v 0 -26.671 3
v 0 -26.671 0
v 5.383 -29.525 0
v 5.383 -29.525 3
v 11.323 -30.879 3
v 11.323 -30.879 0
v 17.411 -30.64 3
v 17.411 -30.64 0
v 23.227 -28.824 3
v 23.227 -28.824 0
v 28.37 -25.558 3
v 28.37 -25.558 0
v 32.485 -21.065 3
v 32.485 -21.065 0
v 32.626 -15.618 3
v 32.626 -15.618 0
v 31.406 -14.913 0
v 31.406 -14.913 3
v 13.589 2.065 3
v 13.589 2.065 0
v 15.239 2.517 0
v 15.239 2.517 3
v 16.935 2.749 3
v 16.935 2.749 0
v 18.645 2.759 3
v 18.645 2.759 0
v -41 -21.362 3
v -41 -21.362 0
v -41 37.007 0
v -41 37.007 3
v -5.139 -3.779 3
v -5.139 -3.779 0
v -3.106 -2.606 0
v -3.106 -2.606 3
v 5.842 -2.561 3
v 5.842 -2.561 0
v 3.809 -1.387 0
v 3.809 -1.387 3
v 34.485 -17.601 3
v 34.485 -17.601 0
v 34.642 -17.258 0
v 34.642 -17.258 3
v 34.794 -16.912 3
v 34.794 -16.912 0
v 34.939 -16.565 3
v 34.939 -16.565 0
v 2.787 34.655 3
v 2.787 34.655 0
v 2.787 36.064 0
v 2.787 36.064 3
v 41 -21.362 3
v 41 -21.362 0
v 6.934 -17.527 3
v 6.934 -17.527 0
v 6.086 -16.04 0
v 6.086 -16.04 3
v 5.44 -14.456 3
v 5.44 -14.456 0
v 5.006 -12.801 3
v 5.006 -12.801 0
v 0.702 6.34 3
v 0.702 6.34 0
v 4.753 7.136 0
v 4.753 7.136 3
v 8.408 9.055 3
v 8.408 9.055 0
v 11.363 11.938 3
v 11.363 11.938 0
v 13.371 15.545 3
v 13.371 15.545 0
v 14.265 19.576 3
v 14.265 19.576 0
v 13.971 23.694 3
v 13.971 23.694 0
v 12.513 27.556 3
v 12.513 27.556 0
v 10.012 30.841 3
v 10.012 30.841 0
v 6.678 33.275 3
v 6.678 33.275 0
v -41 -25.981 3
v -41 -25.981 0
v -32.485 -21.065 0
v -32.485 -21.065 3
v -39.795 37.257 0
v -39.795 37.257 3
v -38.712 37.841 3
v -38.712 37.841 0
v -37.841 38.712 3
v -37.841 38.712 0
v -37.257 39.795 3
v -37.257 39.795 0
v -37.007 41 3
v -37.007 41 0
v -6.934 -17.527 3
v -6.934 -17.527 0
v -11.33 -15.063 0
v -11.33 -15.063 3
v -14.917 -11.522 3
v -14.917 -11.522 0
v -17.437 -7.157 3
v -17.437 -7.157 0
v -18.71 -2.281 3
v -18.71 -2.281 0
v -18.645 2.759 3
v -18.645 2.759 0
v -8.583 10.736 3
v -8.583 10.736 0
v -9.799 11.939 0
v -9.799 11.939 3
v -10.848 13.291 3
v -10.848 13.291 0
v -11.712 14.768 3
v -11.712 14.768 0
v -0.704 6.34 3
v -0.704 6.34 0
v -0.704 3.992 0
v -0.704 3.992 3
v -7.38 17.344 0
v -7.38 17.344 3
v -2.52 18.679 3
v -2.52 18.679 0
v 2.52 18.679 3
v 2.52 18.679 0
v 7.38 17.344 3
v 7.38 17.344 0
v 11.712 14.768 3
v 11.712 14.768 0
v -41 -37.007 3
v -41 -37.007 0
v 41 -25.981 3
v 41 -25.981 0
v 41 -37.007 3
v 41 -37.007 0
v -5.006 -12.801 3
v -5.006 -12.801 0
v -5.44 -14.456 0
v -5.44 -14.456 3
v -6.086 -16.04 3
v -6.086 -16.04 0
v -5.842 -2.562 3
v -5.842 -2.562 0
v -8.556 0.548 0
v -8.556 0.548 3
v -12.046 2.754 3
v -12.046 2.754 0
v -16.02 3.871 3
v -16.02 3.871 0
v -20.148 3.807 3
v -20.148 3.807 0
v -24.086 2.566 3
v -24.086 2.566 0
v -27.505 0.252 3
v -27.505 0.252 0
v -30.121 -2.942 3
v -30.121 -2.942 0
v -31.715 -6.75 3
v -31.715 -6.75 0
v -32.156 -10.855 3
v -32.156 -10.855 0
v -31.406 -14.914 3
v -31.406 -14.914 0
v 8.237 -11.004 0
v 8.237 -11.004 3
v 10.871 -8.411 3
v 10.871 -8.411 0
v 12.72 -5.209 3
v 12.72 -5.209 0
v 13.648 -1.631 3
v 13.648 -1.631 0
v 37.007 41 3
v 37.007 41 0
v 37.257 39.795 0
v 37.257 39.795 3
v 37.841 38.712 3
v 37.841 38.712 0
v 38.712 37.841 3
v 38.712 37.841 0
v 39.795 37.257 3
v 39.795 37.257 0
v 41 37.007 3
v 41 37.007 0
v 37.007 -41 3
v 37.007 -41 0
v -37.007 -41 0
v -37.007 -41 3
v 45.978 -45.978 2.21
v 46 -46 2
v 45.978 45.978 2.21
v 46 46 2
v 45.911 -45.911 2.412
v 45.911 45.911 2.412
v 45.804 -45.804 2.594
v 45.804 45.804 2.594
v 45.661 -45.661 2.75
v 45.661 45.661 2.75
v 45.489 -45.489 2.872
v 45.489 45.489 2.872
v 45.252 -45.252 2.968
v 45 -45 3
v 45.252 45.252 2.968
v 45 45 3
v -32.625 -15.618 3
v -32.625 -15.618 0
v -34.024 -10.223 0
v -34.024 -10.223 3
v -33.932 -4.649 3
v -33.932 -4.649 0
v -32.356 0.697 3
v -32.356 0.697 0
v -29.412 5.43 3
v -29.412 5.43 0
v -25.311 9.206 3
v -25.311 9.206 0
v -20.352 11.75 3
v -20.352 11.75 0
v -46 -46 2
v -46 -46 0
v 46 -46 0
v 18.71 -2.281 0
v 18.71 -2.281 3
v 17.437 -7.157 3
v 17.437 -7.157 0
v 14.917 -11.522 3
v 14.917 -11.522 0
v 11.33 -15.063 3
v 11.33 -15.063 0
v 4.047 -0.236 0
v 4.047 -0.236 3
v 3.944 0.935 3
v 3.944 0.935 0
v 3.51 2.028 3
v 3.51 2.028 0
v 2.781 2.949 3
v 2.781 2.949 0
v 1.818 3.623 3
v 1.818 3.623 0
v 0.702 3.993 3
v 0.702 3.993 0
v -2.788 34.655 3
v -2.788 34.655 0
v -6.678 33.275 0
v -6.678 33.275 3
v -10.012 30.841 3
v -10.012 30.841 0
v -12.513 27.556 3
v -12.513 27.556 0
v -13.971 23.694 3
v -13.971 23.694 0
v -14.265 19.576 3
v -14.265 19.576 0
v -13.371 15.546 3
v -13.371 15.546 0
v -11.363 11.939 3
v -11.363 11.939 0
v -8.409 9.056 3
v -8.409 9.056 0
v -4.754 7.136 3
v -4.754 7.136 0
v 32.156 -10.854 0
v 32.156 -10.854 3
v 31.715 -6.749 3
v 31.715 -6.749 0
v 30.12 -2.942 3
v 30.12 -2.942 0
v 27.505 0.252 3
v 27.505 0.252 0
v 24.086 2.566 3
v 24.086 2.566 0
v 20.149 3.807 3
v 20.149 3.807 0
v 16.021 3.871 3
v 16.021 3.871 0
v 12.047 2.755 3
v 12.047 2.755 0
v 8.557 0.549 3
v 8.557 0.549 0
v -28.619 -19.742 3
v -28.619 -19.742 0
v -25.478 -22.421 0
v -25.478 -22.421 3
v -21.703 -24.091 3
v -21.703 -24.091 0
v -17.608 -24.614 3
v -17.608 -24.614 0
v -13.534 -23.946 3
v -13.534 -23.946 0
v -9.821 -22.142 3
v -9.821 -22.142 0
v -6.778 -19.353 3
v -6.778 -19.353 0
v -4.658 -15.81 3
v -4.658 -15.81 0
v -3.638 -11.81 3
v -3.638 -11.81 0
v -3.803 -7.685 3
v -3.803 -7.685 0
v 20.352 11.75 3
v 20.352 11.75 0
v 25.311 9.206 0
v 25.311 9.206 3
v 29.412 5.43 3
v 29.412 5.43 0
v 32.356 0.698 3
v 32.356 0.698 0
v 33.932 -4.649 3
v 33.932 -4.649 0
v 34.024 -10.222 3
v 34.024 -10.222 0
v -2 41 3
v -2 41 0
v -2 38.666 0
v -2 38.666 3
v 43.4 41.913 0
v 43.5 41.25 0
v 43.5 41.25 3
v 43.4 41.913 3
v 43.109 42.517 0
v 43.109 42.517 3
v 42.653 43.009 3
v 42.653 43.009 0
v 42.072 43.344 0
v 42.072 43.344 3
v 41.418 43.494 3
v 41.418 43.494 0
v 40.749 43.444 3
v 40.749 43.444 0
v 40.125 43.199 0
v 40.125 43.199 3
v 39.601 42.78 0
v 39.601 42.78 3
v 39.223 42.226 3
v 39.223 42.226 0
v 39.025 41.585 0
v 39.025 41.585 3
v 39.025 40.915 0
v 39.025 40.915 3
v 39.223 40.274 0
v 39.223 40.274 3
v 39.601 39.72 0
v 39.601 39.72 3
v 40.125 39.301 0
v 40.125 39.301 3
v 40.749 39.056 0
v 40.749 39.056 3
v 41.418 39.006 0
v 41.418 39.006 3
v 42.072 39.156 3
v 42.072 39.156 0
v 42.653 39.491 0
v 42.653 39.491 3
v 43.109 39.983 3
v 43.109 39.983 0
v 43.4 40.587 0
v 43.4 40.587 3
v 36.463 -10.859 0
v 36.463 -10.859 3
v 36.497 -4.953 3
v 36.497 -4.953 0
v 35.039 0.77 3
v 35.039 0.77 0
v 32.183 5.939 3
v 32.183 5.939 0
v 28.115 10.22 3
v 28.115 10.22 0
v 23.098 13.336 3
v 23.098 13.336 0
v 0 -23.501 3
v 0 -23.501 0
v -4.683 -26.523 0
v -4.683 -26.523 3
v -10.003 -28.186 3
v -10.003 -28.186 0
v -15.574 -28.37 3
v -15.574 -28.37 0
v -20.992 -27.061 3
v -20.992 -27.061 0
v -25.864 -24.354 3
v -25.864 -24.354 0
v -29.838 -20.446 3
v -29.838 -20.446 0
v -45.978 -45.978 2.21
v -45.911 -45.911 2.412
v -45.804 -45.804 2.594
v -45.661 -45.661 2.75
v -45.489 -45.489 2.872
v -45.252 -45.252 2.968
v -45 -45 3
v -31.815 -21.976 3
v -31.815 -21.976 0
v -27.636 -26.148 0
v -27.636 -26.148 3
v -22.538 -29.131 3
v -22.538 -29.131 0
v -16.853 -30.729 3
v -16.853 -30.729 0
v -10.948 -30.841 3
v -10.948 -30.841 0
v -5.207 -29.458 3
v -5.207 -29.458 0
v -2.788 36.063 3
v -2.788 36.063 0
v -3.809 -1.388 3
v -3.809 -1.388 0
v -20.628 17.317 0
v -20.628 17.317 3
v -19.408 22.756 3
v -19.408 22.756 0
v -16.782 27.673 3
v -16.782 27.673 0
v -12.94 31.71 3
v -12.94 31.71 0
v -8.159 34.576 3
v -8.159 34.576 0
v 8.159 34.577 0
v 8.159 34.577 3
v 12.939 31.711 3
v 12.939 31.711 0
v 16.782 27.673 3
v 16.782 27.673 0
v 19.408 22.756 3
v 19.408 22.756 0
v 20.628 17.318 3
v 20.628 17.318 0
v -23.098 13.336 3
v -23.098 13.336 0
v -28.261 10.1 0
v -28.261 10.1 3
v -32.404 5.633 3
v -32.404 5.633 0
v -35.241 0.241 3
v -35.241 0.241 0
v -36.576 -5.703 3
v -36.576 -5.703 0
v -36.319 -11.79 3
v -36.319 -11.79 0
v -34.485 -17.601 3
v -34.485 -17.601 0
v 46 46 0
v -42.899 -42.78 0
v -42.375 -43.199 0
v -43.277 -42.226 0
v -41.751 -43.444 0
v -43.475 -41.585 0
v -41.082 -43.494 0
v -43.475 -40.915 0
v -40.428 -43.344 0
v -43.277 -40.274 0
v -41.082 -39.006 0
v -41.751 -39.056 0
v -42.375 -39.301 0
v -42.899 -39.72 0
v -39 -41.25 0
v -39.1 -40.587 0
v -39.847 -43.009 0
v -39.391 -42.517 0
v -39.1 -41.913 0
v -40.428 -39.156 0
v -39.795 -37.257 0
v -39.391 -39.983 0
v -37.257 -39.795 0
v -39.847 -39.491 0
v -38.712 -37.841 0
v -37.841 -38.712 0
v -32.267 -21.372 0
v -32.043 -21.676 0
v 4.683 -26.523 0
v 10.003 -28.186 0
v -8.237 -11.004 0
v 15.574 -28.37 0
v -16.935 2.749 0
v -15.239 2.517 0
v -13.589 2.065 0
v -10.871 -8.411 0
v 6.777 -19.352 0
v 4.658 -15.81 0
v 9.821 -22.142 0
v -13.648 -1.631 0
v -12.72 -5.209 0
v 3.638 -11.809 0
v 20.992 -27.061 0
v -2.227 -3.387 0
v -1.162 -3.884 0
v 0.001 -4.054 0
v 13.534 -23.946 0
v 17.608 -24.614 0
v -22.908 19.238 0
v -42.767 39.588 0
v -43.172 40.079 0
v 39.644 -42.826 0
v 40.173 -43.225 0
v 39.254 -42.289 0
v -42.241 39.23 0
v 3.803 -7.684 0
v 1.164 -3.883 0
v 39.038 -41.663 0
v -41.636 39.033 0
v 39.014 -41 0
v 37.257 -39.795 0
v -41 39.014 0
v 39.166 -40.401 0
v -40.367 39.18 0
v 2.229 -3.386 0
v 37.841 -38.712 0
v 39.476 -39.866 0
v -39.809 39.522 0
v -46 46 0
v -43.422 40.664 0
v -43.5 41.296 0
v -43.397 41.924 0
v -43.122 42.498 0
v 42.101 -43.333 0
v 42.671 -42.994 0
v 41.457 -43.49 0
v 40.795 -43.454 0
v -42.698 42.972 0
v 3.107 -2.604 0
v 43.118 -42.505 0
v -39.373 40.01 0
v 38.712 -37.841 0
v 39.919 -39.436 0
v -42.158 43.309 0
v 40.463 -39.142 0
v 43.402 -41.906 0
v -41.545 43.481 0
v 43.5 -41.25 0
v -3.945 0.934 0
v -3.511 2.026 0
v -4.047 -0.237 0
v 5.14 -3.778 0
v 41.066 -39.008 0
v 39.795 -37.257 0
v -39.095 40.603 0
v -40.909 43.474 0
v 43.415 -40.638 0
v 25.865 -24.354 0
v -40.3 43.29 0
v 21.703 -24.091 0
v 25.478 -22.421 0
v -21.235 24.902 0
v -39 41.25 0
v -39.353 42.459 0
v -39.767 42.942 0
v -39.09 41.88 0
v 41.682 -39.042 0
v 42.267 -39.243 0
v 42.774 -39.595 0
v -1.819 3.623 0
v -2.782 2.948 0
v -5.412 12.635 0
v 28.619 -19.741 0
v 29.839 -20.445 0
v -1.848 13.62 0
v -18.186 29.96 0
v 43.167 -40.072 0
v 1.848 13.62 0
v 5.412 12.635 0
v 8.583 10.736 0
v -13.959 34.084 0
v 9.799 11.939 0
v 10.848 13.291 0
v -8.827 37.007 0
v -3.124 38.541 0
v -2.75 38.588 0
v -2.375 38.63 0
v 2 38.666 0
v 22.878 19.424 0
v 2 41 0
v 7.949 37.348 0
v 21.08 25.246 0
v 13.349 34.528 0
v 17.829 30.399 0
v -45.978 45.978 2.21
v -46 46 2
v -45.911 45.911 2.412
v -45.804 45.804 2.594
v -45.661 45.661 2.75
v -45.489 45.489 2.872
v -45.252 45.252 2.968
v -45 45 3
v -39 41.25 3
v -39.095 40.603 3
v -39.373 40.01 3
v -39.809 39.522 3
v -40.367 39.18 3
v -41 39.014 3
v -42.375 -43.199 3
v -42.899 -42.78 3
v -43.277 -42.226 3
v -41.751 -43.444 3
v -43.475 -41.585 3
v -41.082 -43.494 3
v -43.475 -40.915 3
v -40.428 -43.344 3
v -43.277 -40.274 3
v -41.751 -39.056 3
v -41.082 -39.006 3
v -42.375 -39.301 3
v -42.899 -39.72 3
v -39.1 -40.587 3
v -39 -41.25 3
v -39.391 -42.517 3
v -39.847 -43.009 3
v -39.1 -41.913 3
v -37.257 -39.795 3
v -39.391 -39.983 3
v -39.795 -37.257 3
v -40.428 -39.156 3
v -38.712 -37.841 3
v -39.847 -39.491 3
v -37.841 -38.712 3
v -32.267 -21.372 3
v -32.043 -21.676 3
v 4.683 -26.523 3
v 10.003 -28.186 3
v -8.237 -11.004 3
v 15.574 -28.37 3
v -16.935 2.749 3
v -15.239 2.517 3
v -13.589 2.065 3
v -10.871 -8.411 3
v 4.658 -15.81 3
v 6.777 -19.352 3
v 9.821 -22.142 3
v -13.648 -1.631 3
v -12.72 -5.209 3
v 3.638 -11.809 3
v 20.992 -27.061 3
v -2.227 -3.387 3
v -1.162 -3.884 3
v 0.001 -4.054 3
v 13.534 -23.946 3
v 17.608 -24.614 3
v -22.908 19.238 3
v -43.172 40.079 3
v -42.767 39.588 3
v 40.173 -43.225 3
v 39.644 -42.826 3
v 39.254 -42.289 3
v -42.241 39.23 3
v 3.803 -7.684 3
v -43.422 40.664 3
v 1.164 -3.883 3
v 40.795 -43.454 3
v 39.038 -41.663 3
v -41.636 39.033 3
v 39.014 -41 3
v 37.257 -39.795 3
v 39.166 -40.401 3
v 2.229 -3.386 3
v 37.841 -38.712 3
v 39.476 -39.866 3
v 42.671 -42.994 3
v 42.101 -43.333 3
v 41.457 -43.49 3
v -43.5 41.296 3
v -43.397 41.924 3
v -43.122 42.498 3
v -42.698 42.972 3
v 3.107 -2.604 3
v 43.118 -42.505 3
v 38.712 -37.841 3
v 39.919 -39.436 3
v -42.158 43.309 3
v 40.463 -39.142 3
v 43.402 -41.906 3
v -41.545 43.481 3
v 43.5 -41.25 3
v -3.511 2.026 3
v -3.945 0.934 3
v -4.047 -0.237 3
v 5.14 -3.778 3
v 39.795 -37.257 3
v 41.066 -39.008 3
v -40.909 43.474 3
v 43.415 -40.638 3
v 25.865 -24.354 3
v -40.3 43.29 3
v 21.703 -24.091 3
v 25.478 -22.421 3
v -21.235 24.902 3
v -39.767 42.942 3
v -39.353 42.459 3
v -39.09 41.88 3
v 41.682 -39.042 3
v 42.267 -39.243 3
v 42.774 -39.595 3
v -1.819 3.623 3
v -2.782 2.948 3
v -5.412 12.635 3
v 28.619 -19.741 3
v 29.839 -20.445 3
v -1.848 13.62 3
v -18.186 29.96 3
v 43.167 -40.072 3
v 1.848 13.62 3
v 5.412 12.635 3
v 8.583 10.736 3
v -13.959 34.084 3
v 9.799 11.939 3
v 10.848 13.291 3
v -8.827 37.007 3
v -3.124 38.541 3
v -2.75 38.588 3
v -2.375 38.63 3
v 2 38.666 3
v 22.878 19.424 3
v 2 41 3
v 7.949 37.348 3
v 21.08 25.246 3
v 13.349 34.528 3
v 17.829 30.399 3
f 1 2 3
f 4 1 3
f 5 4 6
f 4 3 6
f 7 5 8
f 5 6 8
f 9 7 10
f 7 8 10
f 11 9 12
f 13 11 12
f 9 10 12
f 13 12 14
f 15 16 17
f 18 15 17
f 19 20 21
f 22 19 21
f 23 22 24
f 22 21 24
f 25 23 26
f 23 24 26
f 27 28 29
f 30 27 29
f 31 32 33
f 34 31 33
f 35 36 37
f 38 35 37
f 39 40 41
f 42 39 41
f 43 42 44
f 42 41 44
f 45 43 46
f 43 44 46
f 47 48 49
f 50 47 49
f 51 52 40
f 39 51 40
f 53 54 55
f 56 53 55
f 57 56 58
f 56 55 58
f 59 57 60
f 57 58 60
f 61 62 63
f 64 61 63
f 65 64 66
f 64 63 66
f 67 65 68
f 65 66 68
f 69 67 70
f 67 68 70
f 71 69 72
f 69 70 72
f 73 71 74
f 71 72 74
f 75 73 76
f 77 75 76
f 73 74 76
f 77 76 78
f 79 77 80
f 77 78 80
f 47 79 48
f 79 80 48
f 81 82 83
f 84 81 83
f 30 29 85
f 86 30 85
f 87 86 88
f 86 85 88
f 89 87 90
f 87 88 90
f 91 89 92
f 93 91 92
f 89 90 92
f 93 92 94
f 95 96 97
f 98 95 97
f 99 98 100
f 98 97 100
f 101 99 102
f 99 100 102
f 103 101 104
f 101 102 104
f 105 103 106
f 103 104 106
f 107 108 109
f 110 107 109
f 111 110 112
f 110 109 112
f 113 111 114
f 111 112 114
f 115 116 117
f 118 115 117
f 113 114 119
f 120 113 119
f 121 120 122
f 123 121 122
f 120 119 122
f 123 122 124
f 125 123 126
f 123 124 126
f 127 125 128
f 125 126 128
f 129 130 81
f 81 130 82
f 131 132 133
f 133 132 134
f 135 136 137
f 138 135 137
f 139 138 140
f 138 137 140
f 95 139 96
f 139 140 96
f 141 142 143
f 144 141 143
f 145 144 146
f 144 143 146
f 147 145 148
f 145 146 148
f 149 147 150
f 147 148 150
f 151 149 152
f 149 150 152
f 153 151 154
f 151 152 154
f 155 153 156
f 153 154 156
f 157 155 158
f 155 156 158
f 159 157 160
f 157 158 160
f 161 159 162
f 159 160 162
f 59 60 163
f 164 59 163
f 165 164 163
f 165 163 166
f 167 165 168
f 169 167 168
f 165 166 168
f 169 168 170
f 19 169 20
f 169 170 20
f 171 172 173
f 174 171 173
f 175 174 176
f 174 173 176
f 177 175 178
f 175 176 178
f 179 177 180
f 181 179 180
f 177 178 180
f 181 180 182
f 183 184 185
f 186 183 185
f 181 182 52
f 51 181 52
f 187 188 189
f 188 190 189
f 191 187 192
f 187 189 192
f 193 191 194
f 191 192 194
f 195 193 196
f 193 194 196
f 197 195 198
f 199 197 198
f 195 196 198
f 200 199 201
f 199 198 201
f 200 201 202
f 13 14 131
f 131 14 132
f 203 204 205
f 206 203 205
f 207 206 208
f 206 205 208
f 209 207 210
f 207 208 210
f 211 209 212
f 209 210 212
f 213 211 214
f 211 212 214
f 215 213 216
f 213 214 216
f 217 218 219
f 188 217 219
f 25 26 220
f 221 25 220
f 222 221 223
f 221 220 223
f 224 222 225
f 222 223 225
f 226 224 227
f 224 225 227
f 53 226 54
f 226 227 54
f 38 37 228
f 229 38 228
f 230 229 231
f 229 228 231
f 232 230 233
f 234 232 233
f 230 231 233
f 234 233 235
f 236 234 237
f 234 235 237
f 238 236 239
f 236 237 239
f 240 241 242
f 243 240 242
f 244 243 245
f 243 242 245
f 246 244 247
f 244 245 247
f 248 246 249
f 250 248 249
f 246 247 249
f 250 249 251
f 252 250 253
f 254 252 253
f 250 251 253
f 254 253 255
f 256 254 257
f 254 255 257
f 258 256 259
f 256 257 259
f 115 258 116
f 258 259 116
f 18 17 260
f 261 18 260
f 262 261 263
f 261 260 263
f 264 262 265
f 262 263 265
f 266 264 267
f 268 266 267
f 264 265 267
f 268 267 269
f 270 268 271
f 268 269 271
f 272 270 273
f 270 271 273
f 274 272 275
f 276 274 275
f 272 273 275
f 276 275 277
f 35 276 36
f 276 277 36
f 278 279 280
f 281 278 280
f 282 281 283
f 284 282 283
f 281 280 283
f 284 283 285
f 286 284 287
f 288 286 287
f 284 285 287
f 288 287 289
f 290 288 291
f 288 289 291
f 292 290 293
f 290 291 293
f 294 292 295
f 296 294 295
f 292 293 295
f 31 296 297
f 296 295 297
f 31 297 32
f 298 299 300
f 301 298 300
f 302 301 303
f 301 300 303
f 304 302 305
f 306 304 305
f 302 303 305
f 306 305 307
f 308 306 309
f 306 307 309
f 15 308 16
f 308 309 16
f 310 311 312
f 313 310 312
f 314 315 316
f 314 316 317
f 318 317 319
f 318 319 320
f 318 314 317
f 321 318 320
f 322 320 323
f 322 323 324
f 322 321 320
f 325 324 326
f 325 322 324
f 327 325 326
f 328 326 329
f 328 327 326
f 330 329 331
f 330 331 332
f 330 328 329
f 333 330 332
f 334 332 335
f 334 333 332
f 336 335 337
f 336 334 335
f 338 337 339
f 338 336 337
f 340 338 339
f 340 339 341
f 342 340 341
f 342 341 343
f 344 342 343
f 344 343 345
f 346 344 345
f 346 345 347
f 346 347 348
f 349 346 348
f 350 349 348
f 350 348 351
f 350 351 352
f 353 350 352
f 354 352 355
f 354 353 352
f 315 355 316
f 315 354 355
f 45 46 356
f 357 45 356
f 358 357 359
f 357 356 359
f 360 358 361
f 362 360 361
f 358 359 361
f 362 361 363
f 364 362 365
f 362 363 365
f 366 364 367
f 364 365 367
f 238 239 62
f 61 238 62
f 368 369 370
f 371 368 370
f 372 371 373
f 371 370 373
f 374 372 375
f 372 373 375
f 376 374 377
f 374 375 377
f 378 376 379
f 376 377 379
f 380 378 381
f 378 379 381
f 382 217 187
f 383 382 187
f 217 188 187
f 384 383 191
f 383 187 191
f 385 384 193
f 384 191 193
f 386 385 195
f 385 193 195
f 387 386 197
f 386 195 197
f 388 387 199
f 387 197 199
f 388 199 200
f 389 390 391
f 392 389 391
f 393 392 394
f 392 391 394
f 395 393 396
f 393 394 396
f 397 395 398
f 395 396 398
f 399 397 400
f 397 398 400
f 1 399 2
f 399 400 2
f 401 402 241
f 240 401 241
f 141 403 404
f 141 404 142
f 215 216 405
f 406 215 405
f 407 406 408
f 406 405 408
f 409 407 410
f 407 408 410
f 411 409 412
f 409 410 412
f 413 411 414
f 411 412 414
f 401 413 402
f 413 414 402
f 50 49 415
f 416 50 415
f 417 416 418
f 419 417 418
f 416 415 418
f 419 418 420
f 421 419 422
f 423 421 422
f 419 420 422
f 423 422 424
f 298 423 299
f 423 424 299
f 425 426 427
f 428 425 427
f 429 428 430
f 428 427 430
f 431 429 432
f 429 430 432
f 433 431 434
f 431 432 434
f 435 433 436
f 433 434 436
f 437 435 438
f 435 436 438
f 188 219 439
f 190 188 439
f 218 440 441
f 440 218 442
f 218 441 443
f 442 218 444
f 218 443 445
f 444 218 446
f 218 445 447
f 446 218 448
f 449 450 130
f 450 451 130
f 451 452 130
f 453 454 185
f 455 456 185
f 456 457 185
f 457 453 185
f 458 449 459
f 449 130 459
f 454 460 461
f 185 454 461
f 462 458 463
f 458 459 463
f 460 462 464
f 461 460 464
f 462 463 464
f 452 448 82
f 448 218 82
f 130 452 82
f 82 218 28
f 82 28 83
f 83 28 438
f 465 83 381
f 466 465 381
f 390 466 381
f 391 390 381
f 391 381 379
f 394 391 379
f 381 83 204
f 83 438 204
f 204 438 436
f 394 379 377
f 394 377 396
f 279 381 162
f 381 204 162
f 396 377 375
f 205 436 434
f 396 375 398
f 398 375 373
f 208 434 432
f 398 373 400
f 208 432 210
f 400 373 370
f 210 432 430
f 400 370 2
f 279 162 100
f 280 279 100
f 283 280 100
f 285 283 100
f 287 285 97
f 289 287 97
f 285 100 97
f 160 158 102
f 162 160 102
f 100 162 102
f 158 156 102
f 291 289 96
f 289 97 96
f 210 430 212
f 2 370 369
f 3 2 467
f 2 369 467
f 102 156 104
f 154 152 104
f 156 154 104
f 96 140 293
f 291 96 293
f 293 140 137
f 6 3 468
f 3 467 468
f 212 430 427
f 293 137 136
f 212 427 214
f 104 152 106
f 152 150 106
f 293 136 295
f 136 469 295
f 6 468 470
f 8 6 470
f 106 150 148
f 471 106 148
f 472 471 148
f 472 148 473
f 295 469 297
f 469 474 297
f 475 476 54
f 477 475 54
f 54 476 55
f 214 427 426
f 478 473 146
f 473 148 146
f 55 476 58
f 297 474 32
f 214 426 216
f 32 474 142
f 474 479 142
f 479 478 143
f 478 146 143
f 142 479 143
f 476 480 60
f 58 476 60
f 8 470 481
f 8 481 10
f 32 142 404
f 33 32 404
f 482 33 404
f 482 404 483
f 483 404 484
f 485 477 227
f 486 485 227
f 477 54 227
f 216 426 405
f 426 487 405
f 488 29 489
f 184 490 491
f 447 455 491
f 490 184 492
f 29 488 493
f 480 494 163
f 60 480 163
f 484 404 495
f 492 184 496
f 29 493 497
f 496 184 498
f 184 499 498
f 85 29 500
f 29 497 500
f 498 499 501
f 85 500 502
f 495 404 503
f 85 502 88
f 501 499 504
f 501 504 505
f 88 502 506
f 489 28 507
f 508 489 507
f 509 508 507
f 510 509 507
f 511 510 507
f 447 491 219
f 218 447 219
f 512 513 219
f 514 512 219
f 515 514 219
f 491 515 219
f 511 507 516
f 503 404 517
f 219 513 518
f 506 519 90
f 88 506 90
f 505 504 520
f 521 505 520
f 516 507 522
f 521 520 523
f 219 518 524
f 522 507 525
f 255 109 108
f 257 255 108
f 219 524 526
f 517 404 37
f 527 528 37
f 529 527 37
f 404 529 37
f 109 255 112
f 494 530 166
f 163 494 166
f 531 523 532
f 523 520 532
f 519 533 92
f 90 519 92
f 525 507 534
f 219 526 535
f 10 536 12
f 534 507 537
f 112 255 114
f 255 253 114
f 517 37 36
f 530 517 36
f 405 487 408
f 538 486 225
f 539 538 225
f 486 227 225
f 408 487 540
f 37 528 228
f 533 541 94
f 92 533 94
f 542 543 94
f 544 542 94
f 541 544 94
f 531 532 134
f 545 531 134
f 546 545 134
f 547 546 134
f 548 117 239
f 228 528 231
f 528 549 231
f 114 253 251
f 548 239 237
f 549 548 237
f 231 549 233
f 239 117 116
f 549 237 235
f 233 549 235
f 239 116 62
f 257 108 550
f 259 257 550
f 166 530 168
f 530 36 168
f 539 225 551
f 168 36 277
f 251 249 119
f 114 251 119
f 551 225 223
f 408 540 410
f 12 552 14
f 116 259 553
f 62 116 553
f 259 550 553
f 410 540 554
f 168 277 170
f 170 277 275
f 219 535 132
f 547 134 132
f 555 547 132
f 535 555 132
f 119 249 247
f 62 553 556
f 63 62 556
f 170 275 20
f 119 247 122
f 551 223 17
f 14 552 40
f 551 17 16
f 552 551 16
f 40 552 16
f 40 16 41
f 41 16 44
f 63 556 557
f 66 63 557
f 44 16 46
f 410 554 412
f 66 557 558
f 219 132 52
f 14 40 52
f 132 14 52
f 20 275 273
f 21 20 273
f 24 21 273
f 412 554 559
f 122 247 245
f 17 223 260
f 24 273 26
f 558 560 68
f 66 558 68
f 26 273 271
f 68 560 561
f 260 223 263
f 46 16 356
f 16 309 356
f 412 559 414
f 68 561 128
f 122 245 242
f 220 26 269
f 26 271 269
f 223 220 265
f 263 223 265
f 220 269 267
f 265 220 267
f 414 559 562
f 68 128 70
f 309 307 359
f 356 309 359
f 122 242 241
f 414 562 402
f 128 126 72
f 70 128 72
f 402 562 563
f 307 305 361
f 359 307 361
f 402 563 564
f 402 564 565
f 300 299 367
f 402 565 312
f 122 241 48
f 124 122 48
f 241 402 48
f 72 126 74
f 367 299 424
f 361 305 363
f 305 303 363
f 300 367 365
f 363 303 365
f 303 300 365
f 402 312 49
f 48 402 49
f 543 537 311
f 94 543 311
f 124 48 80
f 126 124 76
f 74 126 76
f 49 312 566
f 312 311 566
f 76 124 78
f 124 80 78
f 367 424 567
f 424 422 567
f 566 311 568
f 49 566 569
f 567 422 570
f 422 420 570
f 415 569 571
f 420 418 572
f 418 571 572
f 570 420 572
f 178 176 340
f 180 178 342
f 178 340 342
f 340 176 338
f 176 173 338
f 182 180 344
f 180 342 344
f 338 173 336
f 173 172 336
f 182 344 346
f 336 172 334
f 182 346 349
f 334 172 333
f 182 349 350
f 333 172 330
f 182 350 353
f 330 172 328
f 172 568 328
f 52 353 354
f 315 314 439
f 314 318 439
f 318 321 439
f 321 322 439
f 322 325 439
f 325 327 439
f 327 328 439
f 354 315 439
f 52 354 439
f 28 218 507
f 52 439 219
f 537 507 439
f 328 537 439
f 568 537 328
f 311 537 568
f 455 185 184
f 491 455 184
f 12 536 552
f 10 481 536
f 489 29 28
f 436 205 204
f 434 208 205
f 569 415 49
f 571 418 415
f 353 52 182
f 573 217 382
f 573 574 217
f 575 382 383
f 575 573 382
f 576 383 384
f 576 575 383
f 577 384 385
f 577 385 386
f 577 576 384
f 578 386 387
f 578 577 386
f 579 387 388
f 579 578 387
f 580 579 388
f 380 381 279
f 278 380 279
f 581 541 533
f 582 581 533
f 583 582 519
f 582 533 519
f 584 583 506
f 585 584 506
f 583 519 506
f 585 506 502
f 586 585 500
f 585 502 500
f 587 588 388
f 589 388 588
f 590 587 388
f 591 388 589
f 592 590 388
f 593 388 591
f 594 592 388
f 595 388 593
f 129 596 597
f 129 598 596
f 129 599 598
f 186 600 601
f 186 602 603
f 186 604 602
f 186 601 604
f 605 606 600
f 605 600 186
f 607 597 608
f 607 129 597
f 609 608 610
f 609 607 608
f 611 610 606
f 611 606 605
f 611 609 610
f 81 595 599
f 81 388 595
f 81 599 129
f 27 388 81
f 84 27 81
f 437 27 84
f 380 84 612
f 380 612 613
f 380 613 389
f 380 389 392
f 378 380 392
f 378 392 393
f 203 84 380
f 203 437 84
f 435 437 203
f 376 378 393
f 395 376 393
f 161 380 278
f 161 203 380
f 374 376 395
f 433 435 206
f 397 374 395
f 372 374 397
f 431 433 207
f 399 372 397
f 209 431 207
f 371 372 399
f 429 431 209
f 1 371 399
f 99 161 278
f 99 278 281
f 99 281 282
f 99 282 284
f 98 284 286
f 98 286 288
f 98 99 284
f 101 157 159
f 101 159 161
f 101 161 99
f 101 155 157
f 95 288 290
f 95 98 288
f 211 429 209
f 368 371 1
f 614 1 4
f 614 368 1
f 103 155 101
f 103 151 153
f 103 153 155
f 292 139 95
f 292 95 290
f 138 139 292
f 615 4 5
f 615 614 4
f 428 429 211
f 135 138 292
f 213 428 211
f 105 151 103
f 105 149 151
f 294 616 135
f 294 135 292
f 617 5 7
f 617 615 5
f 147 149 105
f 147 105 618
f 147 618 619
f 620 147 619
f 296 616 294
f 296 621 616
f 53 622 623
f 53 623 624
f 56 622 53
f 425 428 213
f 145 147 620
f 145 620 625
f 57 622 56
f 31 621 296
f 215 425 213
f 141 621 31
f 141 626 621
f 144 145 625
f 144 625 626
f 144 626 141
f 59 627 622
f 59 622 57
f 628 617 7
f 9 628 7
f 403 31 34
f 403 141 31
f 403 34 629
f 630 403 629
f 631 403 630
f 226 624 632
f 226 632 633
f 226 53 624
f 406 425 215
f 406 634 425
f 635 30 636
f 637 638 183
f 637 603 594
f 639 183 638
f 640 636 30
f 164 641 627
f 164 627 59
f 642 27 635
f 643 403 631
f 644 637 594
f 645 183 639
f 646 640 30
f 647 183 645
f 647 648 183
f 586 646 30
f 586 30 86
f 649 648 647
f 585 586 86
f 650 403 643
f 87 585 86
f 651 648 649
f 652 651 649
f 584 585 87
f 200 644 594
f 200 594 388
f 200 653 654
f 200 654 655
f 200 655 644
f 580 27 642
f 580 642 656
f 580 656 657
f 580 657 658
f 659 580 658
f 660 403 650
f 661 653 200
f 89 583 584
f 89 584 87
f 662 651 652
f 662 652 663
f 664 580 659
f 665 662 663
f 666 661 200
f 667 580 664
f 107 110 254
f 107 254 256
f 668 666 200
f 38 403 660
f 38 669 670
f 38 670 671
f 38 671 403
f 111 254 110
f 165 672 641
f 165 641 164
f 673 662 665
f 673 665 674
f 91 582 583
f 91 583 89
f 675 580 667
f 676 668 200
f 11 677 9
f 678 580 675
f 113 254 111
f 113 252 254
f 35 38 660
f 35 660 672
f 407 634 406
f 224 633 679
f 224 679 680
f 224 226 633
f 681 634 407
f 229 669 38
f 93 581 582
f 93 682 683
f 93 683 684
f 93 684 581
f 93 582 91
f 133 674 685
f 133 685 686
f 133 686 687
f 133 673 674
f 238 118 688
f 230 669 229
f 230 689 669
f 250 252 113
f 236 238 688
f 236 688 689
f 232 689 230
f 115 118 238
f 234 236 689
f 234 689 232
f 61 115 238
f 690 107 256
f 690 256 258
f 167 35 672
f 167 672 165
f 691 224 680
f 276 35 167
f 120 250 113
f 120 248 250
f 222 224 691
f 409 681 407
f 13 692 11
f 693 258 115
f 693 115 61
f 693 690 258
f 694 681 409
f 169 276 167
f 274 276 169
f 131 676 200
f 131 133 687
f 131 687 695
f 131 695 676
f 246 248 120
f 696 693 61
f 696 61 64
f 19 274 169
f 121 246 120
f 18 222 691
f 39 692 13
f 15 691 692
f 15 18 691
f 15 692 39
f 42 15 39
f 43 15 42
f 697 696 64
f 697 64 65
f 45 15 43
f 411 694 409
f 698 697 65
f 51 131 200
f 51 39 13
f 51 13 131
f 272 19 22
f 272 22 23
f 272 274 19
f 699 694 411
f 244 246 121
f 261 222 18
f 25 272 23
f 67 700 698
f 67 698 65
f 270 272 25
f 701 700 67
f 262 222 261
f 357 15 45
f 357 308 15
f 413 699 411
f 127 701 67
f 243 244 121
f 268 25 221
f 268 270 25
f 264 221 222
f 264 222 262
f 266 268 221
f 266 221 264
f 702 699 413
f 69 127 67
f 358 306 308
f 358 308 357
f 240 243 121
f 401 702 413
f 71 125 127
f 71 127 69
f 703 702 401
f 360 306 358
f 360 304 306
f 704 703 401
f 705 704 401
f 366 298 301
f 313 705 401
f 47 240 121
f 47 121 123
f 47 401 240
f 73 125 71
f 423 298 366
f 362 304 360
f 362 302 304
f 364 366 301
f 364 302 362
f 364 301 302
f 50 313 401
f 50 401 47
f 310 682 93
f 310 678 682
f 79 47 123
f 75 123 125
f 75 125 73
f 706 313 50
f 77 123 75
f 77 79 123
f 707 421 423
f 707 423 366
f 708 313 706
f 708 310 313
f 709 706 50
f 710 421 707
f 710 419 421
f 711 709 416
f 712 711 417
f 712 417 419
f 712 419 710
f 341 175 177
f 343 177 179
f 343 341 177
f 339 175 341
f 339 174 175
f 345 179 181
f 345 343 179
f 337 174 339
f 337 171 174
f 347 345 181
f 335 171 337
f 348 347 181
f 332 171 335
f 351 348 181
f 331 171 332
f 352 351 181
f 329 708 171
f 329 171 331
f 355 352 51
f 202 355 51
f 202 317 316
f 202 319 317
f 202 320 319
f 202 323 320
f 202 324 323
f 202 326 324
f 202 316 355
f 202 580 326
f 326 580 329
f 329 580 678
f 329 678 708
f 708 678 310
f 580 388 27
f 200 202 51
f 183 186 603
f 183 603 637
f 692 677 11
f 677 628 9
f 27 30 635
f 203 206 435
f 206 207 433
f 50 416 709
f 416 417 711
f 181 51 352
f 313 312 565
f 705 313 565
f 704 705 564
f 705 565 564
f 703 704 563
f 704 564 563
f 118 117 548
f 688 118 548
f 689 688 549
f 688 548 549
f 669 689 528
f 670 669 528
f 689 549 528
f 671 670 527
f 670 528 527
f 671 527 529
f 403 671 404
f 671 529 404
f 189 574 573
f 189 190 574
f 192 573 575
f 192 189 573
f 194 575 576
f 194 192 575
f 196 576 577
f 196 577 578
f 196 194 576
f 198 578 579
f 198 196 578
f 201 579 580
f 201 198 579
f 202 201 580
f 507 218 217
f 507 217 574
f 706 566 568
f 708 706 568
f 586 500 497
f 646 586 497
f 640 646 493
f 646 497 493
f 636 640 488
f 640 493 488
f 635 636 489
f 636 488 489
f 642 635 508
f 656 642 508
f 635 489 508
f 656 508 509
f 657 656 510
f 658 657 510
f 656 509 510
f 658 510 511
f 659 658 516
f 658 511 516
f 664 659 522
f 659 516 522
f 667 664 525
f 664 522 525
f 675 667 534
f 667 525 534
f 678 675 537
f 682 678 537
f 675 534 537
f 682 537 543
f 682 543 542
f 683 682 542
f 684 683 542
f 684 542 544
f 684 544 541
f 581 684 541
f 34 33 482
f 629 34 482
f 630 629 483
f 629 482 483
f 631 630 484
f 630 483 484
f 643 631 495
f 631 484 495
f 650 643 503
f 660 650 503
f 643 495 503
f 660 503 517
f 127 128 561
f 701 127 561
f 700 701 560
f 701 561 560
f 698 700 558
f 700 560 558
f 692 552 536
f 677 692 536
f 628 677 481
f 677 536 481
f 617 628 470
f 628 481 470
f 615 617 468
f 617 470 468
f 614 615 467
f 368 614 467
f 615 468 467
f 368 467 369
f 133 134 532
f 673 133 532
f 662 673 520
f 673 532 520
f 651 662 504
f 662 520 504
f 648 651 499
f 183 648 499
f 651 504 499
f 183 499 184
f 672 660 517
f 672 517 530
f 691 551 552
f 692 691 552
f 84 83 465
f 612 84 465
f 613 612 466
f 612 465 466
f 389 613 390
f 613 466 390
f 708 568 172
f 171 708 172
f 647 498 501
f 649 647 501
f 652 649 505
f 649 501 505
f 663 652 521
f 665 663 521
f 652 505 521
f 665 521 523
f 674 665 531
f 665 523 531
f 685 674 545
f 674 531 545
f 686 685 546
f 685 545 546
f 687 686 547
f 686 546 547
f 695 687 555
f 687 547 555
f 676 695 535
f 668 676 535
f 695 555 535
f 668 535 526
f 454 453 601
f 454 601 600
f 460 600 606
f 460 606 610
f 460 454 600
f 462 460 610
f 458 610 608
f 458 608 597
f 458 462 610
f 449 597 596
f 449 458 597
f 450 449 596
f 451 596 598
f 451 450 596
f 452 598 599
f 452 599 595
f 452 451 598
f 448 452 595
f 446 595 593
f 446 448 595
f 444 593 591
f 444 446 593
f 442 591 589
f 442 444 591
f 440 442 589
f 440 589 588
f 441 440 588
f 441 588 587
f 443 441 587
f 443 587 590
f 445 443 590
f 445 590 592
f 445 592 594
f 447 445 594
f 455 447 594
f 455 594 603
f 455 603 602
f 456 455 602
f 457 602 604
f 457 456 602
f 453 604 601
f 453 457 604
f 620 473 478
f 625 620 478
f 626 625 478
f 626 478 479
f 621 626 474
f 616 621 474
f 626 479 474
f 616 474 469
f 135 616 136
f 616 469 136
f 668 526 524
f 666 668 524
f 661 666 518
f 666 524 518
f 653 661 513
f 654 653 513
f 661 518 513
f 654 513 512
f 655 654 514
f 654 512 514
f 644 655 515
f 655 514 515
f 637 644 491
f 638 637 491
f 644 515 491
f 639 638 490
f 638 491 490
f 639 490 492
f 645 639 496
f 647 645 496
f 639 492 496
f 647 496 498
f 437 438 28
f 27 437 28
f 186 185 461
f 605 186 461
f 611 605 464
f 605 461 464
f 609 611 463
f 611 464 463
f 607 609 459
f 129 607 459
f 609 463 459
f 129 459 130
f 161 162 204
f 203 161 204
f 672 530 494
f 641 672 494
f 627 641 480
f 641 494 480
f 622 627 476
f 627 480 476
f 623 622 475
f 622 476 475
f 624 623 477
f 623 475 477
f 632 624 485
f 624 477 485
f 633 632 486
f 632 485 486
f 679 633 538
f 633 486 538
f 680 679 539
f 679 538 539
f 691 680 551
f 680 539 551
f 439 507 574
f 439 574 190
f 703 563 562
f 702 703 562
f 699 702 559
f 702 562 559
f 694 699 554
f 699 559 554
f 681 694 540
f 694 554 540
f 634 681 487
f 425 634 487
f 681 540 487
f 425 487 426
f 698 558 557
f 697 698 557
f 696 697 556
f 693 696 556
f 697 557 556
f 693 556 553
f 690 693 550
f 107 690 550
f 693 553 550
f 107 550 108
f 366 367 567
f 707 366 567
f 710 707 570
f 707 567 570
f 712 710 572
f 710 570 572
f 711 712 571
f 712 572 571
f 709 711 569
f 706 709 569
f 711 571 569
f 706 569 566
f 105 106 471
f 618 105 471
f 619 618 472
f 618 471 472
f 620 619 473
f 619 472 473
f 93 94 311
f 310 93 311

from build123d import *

# Parameters (mm, degrees)
F0_W     = 92
F0_H     = 92
F0_R     = 2.25
F1_DEPTH = 3
F2_R     = 1


with BuildPart() as f1:
    # F0 (on Top) → F1 (new body)
    with BuildSketch(Plane.XY):
        Rectangle(F0_W, F0_H)
        with Locations((-41.25, -41.25)):
            Circle(F0_R, mode=Mode.SUBTRACT)
        with BuildLine():
            ThreePointArc((-6.933505, -17.526739), (-16.323145, -9.424172), (-18.645354, 2.758778))
            ThreePointArc((-18.645354, 2.758778), (-16.0832, 2.660706), (-13.58927, 2.065258))
            ThreePointArc((-13.58927, 2.065258), (-11.903787, -6.872655), (-5.006069, -12.801282))
            ThreePointArc((-5.006069, -12.801282), (-5.737361, -15.258813), (-6.933505, -17.526739))
        make_face(mode=Mode.SUBTRACT)
        with BuildLine():
            ThreePointArc((-32.485448, -21.064883), (-32.155826, -21.524565), (-31.815096, -21.976076))
            ThreePointArc((-31.815096, -21.976076), (-16.852854, -30.72923), (0, -26.671184))
            ThreePointArc((0, -26.671184), (17.411393, -30.639834), (32.485448, -21.064883))
            Line((32.485448, -21.064883), (41, -25.980762))
            Line((41, -25.980762), (41, -37.007359))
            ThreePointArc((41, -37.007359), (38.244796, -38.244796), (37.007359, -41))
            Line((37.007359, -41), (-37.007359, -41))
            ThreePointArc((-37.007359, -41), (-38.244796, -38.244796), (-41, -37.007359))
            Line((-41, -37.007359), (-41, -25.980762))
            Line((-41, -25.980762), (-32.485448, -21.064883))
        make_face(mode=Mode.SUBTRACT)
        with BuildLine():
            ThreePointArc((39.013932, -41), (41.375194, -39.003486), (43.5, -41.25))
            ThreePointArc((43.5, -41.25), (41.124806, -43.496514), (39.013932, -41))
        make_face(mode=Mode.SUBTRACT)
        with BuildLine():
            Line((3.106614, -2.604224), (5.139537, -3.777932))
            ThreePointArc((5.139537, -3.777932), (9.820807, -22.141646), (28.619151, -19.741116))
            Line((28.619151, -19.741116), (29.838639, -20.445188))
            ThreePointArc((29.838639, -20.445188), (15.574425, -28.370131), (0, -23.500859))
            ThreePointArc((0, -23.500859), (-15.573952, -28.370179), (-29.838057, -20.44594))
            Line((-29.838057, -20.44594), (-28.618517, -19.741839))
            ThreePointArc((-28.618517, -19.741839), (-9.821108, -22.141851), (-5.138765, -3.779435))
            Line((-5.138765, -3.779435), (-3.105514, -2.605536))
            ThreePointArc((-3.105514, -2.605536), (0.000856, -4.053768), (3.106614, -2.604224))
        make_face(mode=Mode.SUBTRACT)
        with BuildLine():
            ThreePointArc((18.645354, 2.758778), (16.323145, -9.424172), (6.933505, -17.526739))
            ThreePointArc((6.933505, -17.526739), (5.737361, -15.258813), (5.006069, -12.801282))
            ThreePointArc((5.006069, -12.801282), (11.903787, -6.872655), (13.58927, 2.065258))
            ThreePointArc((13.58927, 2.065258), (16.0832, 2.660706), (18.645354, 2.758778))
        make_face(mode=Mode.SUBTRACT)
        with BuildLine():
            Line((-41, -21.36196), (-41, 37.007359))
            ThreePointArc((-41, 37.007359), (-38.244796, 38.244796), (-37.007359, 41))
            Line((-37.007359, 41), (-2, 41))
            Line((-2, 41), (-2, 38.665665))
            ThreePointArc((-2, 38.665665), (-2.562907, 38.610045), (-3.124292, 38.54072))
            ThreePointArc((-3.124292, 38.54072), (-18.185867, 29.959614), (-23.097923, 13.335592))
            ThreePointArc((-23.097923, 13.335592), (-35.240571, 0.241208), (-34.485448, -17.600782))
            Line((-34.485448, -17.600782), (-41, -21.36196))
        make_face(mode=Mode.SUBTRACT)
        with BuildLine():
            Line((-0.703704, 6.340019), (-0.703704, 3.992222))
            ThreePointArc((-0.703704, 3.992222), (-3.511094, 2.026142), (-3.808631, -1.388295))
            Line((-3.808631, -1.388295), (-5.841554, -2.562003))
            ThreePointArc((-5.841554, -2.562003), (-24.085631, 2.565755), (-31.405884, -14.914353))
            Line((-31.405884, -14.914353), (-32.625372, -15.618425))
            ThreePointArc((-32.625372, -15.618425), (-32.356466, 0.697218), (-20.352341, 11.75043))
            ThreePointArc((-20.352341, 11.75043), (-16.78232, 27.672527), (-2.787675, 36.063485))
            Line((-2.787675, 36.063485), (-2.787675, 34.655283))
            ThreePointArc((-2.787675, 34.655283), (-14.264851, 19.576254), (-0.703704, 6.340019))
        make_face(mode=Mode.SUBTRACT)
        with BuildLine():
            ThreePointArc((-41, 39.013932), (-42.927051, 42.75), (-39, 41.25))
            ThreePointArc((-39, 41.25), (-39.572949, 39.75), (-41, 39.013932))
        make_face(mode=Mode.SUBTRACT)
        with BuildLine():
            Line((0.702017, 3.992519), (0.702017, 6.339936))
            ThreePointArc((0.702017, 6.339936), (14.264824, 19.575891), (2.786733, 34.65547))
            Line((2.786733, 34.65547), (2.786733, 36.063613))
            ThreePointArc((2.786733, 36.063613), (16.782041, 27.672913), (20.352341, 11.75043))
            ThreePointArc((20.352341, 11.75043), (32.356272, 0.697652), (32.625732, -15.617545))
            Line((32.625732, -15.617545), (31.406193, -14.913444))
            ThreePointArc((31.406193, -14.913444), (24.085959, 2.565596), (5.842469, -2.560584))
            Line((5.842469, -2.560584), (3.809217, -1.386686))
            ThreePointArc((3.809217, -1.386686), (3.510238, 2.027625), (0.702017, 3.992519))
        make_face(mode=Mode.SUBTRACT)
        with BuildLine():
            ThreePointArc((34.485448, -17.600782), (34.718733, -17.08548), (34.939388, -16.564644))
            ThreePointArc((34.939388, -16.564644), (35.03872, 0.769615), (23.097923, 13.335592))
            ThreePointArc((23.097923, 13.335592), (17.829178, 30.398626), (2, 38.665665))
            Line((2, 38.665665), (2, 41))
            Line((2, 41), (37.007359, 41))
            ThreePointArc((37.007359, 41), (38.244796, 38.244796), (41, 37.007359))
            Line((41, 37.007359), (41, -21.36196))
            Line((41, -21.36196), (34.485448, -17.600782))
        make_face(mode=Mode.SUBTRACT)
        with BuildLine():
            ThreePointArc((-11.711849, 14.767961), (0, 18.848344), (11.711849, 14.767961))
            ThreePointArc((11.711849, 14.767961), (10.345839, 12.598107), (8.583201, 10.736024))
            ThreePointArc((8.583201, 10.736024), (0, 13.74531), (-8.583201, 10.736024))
            ThreePointArc((-8.583201, 10.736024), (-10.345839, 12.598107), (-11.711849, 14.767961))
        make_face(mode=Mode.SUBTRACT)
        with Locations((41.25, 41.25)):
            Circle(F0_R, mode=Mode.SUBTRACT)
    extrude(amount=F1_DEPTH)

    # F2
    f2_edges = [f1.edges().sort_by_distance(p)[0] for p in [
        (0, 46, 3),
        (46, 0, 3),
        (-46, 0, 3),
        (0, -46, 3),
    ]]
    fillet(f2_edges, radius=F2_R)


solid = f1.part
